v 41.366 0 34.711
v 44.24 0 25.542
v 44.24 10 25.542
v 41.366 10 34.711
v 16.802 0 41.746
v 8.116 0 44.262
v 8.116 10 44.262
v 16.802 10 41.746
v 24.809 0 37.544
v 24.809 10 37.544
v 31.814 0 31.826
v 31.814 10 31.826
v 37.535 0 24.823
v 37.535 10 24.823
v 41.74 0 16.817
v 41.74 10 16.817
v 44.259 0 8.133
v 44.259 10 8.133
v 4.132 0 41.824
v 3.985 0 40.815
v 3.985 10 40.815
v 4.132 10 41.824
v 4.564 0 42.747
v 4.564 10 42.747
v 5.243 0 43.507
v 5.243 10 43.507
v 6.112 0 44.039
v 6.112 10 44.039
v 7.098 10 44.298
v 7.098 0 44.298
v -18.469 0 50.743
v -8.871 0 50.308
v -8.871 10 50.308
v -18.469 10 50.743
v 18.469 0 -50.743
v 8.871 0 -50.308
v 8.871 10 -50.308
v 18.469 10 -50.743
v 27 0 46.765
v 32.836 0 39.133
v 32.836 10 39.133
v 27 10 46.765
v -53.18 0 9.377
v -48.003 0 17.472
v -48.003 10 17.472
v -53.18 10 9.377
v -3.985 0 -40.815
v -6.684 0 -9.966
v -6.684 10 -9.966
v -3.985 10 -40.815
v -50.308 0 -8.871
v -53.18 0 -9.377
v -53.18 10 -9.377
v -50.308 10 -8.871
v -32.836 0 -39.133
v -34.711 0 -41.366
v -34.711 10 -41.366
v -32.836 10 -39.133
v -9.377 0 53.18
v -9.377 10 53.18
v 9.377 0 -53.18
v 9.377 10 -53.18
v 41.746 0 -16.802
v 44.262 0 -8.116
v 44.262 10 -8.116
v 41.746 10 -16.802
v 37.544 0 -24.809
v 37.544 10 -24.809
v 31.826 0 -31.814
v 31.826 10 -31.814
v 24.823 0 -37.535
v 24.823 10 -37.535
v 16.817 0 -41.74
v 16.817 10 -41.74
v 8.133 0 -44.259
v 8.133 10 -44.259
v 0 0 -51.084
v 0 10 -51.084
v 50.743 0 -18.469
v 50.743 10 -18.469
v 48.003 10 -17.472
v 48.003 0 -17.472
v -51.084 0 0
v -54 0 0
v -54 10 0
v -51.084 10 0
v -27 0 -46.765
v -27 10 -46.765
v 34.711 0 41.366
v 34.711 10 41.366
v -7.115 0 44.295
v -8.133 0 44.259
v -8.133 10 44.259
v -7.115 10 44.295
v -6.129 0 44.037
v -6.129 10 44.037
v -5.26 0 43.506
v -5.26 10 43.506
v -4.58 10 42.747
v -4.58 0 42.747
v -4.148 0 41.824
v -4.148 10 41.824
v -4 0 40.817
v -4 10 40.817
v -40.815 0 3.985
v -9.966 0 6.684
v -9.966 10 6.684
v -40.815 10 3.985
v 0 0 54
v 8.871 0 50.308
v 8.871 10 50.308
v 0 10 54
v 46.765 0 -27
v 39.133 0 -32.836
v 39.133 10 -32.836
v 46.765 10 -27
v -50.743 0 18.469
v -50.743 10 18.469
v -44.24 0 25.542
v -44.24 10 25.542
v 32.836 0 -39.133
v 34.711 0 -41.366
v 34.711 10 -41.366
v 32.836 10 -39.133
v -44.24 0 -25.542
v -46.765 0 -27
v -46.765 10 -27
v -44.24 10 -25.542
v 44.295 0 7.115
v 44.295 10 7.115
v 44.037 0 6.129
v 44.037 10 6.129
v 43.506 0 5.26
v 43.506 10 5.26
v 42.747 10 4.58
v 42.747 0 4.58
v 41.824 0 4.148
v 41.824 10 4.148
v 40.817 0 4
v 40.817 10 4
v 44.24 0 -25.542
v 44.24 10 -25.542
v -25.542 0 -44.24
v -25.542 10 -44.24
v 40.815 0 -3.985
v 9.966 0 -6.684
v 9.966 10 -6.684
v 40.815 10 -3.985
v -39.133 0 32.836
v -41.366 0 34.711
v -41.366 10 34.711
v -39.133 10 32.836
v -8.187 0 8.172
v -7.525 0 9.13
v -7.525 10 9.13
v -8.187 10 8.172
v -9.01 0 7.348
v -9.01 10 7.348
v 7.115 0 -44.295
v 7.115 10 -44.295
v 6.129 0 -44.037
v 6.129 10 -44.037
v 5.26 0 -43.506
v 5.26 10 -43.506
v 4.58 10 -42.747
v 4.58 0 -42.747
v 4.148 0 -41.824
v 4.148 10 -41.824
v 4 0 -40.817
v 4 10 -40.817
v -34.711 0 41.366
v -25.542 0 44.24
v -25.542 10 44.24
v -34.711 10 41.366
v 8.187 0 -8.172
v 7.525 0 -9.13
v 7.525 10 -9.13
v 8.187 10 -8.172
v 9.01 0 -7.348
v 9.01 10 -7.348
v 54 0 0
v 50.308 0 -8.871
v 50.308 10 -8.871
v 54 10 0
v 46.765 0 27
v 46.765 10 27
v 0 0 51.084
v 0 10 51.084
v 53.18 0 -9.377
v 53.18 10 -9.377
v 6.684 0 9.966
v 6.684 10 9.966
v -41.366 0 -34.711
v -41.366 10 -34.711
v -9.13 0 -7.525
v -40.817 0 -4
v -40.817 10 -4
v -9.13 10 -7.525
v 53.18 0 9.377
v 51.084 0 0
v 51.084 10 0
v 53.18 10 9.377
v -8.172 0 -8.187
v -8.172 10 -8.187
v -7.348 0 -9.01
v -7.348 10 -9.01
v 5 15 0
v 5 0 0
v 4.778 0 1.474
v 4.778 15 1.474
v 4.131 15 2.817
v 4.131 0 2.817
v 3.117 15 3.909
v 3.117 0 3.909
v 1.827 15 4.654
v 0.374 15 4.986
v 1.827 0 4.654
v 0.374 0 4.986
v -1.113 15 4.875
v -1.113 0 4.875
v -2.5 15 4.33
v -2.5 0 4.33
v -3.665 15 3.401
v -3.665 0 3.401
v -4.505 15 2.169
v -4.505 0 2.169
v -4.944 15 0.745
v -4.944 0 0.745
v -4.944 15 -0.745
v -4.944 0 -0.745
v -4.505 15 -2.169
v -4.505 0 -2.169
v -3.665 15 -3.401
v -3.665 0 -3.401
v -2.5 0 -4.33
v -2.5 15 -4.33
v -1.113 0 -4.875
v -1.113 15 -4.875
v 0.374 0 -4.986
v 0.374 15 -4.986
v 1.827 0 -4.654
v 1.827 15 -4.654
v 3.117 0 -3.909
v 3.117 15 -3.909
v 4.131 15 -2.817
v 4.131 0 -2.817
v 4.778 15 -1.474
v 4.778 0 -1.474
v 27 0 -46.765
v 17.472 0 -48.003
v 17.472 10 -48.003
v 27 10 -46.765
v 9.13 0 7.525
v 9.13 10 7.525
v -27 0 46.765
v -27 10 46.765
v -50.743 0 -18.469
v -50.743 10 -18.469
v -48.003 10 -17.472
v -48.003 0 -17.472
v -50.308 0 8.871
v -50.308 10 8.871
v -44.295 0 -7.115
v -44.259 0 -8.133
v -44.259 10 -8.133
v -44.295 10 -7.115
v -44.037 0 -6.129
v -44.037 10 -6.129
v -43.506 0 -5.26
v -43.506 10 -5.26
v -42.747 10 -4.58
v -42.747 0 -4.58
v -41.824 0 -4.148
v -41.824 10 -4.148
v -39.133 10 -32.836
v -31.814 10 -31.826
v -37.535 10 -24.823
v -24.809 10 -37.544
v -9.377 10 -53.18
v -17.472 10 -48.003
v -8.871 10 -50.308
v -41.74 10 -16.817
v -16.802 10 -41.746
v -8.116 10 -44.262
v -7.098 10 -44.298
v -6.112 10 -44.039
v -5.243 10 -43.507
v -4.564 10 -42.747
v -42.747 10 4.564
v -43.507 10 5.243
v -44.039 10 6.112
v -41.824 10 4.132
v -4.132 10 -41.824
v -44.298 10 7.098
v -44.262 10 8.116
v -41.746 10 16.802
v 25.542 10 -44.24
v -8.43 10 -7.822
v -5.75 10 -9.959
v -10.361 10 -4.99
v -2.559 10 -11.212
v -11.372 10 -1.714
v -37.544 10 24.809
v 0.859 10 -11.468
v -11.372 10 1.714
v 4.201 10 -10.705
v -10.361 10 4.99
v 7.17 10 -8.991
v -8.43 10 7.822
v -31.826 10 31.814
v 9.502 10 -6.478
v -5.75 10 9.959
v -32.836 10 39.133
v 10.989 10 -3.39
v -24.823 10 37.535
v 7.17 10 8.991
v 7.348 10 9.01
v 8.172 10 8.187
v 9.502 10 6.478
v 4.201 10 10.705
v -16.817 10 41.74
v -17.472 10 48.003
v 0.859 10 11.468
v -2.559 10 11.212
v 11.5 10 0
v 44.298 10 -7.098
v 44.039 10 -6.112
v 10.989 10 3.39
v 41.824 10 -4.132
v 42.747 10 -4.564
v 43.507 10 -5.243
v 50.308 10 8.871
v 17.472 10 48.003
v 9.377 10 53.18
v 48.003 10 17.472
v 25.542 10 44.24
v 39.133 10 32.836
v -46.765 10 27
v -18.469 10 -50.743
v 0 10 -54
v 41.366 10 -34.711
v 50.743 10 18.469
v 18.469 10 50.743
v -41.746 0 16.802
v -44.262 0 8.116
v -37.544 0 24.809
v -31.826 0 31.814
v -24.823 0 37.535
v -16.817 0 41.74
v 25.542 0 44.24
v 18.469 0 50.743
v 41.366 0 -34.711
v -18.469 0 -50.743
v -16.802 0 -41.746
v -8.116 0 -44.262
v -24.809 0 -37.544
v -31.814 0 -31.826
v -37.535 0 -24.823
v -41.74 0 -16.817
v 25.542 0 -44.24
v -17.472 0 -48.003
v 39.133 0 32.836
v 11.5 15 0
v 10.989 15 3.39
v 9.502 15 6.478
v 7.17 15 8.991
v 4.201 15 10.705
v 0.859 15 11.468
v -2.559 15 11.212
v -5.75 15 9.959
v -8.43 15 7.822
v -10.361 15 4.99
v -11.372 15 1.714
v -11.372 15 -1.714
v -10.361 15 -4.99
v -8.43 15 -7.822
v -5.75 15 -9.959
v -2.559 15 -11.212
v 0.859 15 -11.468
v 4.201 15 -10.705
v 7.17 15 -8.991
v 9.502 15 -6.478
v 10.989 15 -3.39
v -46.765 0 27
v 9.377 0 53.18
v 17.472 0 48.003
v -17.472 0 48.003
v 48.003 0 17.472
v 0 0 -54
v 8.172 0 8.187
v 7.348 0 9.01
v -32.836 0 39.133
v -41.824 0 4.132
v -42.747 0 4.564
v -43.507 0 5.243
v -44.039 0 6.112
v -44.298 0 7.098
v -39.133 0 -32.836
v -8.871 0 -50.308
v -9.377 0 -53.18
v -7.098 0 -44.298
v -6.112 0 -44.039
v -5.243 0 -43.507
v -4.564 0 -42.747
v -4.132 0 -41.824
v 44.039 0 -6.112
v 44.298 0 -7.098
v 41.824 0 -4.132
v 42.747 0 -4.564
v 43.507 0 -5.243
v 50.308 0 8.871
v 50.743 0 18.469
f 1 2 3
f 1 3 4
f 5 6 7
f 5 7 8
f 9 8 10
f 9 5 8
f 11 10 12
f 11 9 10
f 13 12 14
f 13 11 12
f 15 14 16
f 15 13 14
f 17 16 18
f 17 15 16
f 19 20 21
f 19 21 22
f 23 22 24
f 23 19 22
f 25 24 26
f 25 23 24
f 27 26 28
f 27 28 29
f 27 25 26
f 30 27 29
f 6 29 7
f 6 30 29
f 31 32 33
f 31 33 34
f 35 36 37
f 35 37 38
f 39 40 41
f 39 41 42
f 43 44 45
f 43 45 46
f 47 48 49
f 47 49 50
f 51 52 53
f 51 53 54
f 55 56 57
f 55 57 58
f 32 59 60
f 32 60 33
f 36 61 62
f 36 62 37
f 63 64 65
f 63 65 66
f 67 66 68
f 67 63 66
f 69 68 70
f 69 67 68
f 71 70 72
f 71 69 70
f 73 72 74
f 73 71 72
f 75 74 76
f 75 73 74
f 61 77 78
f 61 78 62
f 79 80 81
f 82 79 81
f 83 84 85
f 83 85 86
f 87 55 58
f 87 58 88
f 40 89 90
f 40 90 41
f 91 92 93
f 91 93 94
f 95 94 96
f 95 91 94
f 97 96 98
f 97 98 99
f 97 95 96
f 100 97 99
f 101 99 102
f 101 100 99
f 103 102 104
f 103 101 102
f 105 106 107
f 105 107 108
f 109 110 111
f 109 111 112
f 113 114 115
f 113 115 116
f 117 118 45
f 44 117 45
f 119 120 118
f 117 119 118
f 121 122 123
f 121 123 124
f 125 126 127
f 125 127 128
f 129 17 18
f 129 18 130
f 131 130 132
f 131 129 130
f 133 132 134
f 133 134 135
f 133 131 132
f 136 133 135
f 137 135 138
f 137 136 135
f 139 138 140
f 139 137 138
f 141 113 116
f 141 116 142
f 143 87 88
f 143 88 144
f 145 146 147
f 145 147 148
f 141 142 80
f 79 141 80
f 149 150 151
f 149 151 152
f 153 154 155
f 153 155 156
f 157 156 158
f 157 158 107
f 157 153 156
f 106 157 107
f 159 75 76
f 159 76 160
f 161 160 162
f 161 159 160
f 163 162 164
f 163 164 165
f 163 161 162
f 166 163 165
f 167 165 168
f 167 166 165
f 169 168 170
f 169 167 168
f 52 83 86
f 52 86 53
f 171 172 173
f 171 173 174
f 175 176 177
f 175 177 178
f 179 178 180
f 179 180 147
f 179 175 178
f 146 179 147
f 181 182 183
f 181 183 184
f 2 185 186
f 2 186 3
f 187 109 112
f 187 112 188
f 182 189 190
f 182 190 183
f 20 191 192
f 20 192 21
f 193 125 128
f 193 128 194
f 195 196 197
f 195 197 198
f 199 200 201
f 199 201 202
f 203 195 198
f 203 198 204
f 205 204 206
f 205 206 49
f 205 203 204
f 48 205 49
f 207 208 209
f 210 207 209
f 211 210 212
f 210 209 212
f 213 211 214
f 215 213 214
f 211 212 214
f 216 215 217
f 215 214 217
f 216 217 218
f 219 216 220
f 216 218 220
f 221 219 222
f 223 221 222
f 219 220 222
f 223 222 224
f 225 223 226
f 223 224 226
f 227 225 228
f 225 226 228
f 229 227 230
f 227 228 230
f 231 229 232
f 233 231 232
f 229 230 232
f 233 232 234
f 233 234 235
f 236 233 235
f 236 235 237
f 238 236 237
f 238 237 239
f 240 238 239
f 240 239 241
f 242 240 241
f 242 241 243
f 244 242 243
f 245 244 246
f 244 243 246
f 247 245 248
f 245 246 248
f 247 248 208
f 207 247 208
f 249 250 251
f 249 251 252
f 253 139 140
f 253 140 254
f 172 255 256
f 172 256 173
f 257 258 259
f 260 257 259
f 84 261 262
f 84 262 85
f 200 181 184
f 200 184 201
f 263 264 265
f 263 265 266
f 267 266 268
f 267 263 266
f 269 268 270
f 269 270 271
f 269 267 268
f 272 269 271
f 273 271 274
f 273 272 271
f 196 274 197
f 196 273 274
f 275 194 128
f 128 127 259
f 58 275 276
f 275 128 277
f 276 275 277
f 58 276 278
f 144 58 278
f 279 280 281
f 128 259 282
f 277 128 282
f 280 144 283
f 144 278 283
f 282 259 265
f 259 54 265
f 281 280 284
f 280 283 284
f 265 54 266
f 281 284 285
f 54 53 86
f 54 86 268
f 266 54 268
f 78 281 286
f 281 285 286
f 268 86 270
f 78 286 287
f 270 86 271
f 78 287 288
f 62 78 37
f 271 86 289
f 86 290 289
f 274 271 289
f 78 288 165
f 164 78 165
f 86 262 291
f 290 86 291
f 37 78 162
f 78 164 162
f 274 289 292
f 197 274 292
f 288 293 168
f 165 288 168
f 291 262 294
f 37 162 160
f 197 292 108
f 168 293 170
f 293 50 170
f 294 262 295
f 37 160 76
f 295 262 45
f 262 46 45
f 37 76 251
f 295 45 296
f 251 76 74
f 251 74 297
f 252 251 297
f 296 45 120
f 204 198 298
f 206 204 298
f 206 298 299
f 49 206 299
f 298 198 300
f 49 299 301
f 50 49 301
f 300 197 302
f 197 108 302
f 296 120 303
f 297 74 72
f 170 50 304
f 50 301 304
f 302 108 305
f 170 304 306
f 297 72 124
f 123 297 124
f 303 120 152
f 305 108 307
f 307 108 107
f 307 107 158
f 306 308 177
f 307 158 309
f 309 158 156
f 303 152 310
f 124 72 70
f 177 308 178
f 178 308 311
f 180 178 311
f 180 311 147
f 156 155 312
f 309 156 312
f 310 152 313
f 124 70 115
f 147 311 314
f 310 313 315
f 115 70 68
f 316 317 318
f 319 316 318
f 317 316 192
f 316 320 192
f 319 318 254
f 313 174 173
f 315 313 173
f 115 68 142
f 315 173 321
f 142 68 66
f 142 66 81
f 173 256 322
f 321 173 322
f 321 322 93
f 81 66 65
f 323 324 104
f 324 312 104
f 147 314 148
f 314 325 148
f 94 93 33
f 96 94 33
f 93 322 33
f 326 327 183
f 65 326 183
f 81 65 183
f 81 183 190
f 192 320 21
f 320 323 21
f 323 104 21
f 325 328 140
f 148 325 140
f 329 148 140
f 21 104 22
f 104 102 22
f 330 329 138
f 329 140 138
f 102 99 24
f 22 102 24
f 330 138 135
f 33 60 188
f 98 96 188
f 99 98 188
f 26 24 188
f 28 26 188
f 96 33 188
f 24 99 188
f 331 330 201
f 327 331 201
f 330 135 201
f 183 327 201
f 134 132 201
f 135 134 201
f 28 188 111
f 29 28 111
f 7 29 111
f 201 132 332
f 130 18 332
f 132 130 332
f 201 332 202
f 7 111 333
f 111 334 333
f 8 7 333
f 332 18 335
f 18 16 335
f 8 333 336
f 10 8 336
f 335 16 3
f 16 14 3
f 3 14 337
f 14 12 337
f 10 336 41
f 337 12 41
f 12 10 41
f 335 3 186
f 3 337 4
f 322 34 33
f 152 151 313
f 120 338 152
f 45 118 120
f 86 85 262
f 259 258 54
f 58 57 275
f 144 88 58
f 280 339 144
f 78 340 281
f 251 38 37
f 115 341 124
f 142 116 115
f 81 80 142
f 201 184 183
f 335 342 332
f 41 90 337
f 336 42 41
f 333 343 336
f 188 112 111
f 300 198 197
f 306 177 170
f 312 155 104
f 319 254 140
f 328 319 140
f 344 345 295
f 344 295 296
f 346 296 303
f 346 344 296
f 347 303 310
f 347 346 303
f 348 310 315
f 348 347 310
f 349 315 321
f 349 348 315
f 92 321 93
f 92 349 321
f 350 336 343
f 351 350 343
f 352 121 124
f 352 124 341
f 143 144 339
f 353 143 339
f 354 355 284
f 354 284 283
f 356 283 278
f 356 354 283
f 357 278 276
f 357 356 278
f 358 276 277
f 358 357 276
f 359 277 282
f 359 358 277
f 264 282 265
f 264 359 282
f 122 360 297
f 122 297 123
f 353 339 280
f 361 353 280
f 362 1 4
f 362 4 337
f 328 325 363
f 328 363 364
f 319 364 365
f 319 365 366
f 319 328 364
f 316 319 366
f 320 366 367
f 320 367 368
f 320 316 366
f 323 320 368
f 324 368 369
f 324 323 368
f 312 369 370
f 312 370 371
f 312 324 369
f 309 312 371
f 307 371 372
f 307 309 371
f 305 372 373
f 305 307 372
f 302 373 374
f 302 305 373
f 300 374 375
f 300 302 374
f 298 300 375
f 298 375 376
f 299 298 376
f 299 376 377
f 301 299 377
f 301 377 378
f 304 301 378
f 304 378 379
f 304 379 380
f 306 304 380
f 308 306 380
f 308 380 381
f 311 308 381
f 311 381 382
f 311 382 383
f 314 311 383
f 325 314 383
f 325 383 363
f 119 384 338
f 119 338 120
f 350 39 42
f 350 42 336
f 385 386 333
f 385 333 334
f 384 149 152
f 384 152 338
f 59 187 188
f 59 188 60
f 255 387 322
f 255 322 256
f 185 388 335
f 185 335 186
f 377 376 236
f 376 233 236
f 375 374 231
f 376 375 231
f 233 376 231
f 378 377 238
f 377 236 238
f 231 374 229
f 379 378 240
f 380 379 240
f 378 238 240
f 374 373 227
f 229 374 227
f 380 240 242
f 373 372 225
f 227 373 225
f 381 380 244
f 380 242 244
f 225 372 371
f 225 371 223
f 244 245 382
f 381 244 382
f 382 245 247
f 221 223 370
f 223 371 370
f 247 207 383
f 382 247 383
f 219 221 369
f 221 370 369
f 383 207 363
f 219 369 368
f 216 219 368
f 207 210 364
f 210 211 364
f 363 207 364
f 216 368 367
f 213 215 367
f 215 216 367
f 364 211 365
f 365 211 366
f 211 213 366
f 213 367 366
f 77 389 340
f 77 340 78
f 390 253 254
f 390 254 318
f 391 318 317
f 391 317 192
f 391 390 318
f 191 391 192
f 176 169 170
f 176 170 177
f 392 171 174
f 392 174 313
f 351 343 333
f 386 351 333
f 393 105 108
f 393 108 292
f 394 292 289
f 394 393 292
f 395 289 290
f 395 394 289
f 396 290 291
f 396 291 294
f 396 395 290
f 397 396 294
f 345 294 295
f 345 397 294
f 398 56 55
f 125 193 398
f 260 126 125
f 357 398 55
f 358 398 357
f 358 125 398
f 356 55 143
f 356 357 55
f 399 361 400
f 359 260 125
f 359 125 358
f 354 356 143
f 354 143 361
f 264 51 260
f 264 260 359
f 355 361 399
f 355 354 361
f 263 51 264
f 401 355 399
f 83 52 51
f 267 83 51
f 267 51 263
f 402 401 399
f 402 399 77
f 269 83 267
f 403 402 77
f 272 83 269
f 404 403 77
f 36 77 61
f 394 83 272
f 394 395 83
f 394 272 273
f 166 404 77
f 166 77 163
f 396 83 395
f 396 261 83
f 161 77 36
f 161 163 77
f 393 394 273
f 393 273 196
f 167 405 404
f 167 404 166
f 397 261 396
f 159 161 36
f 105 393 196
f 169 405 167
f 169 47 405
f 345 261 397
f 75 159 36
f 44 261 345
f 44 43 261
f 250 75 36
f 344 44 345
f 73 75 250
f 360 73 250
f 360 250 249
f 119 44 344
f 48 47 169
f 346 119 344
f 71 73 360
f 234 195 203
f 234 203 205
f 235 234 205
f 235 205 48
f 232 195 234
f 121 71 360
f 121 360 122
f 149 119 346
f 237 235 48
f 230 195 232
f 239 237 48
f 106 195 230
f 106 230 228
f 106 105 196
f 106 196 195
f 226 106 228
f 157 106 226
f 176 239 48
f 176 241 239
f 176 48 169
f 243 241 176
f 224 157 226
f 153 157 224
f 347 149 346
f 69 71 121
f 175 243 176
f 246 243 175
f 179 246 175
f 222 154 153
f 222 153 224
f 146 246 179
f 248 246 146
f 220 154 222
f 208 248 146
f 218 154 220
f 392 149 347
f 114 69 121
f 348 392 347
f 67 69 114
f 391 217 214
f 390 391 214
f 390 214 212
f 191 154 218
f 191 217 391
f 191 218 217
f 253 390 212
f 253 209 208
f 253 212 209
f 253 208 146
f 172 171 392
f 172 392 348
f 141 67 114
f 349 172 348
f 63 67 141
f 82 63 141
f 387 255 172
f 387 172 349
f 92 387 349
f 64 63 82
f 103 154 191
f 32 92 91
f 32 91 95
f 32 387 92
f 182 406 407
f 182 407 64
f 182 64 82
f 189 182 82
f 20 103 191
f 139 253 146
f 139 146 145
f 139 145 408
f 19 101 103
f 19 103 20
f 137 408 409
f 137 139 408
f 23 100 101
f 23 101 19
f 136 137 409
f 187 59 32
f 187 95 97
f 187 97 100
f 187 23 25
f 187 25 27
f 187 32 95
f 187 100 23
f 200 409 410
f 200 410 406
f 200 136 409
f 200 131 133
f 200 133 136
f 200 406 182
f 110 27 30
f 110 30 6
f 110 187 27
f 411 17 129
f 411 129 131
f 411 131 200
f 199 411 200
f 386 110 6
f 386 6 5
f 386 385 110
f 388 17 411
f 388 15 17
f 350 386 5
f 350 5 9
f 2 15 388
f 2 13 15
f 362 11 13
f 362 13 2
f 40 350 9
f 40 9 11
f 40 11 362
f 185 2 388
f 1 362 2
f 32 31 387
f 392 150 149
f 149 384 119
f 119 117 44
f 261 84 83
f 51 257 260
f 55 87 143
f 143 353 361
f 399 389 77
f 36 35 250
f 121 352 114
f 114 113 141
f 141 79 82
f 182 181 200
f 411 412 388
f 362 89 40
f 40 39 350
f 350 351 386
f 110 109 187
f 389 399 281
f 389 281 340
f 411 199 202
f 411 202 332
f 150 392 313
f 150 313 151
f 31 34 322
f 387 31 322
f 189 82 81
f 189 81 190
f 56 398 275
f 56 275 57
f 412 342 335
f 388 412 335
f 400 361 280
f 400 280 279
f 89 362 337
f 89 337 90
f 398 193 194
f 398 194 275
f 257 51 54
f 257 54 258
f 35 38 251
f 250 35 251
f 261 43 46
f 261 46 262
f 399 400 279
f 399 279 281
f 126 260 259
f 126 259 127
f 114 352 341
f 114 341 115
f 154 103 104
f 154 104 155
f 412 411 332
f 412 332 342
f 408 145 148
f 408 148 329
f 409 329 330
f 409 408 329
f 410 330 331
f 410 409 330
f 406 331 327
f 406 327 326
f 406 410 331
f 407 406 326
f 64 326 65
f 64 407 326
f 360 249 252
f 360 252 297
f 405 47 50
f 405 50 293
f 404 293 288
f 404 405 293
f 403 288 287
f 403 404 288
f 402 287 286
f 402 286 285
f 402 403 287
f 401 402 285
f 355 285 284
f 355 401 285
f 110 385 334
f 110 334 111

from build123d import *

# Parameters (mm, degrees)
F0_R     = 11.5
F1_DEPTH = 10
F0_R_2   = 5
F2_DEPTH = 15


with BuildPart() as f1:
    # F0 (on Front) → F1 (new body)
    with BuildSketch(Plane.XZ):
        Polygon((0, 54), (0, 51.083995), (-9.377002, 53.179619), (-8.870643, 50.307914), (-18.469088, 50.743402), (-17.471755, 48.003253), (-27, 46.765372), (-25.541998, 44.240037), (-34.710531, 41.3664), (-32.836159, 39.132611), (-41.3664, 34.710531), (-39.132611, 32.836159), (-46.765372, 27), (-44.240037, 25.541998), (-50.743402, 18.469088), (-48.003253, 17.471755), (-53.179619, 9.377002), (-50.307914, 8.870643), (-54, 0), (-51.083995, 0), (-53.179619, -9.377002), (-50.307914, -8.870643), (-50.743402, -18.469088), (-48.003253, -17.471755), (-46.765372, -27), (-44.240037, -25.541998), (-41.3664, -34.710531), (-39.132611, -32.836159), (-34.710531, -41.3664), (-32.836159, -39.132611), (-27, -46.765372), (-25.541998, -44.240037), (-18.469088, -50.743402), (-17.471755, -48.003253), (-9.377002, -53.179619), (-8.870643, -50.307914), (0, -54), (0, -51.083995), (9.377002, -53.179619), (8.870643, -50.307914), (18.469088, -50.743402), (17.471755, -48.003253), (27, -46.765372), (25.541998, -44.240037), (34.710531, -41.3664), (32.836159, -39.132611), (41.3664, -34.710531), (39.132611, -32.836159), (46.765372, -27), (44.240037, -25.541998), (50.743402, -18.469088), (48.003253, -17.471755), (53.179619, -9.377002), (50.307914, -8.870643), (54, 0), (51.083995, 0), (53.179619, 9.377002), (50.307914, 8.870643), (50.743402, 18.469088), (48.003253, 17.471755), (46.765372, 27), (44.240037, 25.541998), (41.3664, 34.710531), (39.132611, 32.836159), (34.710531, 41.3664), (32.836159, 39.132611), (27, 46.765372), (25.541998, 44.240037), (18.469088, 50.743402), (17.471755, 48.003253), (9.377002, 53.179619), (8.870643, 50.307914), align=None)
        with BuildLine():
            Line((-6.683914, -9.966208), (-3.984963, -40.815351))
            ThreePointArc((-3.984963, -40.815351), (-5.242796, -43.506931), (-8.116223, -44.262026))
            ThreePointArc((-8.116223, -44.262026), (-31.813943, -31.825666), (-44.259032, -8.13253))
            ThreePointArc((-44.259032, -8.13253), (-43.505888, -5.259895), (-40.816663, -4))
            Line((-40.816663, -4), (-9.129554, -7.524517))
            ThreePointArc((-9.129554, -7.524517), (-7.741489, -8.57985), (-6.683914, -9.966208))
        make_face(mode=Mode.SUBTRACT)
        with BuildLine():
            Line((9.966208, -6.683914), (40.815351, -3.984963))
            ThreePointArc((40.815351, -3.984963), (43.506931, -5.242796), (44.262026, -8.116223))
            ThreePointArc((44.262026, -8.116223), (31.825666, -31.813943), (8.13253, -44.259032))
            ThreePointArc((8.13253, -44.259032), (5.259895, -43.505888), (4, -40.816663))
            Line((4, -40.816663), (7.524517, -9.129554))
            ThreePointArc((7.524517, -9.129554), (8.57985, -7.741489), (9.966208, -6.683914))
        make_face(mode=Mode.SUBTRACT)
        with BuildLine():
            ThreePointArc((-44.262026, 8.116223), (-31.825666, 31.813943), (-8.13253, 44.259032))
            ThreePointArc((-8.13253, 44.259032), (-5.259895, 43.505888), (-4, 40.816663))
            Line((-4, 40.816663), (-7.524517, 9.129554))
            ThreePointArc((-7.524517, 9.129554), (-8.57985, 7.741489), (-9.966208, 6.683914))
            Line((-9.966208, 6.683914), (-40.815351, 3.984963))
            ThreePointArc((-40.815351, 3.984963), (-43.506931, 5.242796), (-44.262026, 8.116223))
        make_face(mode=Mode.SUBTRACT)
        Circle(F0_R, mode=Mode.SUBTRACT)
        with BuildLine():
            Line((6.683914, 9.966208), (3.984963, 40.815351))
            ThreePointArc((3.984963, 40.815351), (5.242796, 43.506931), (8.116223, 44.262026))
            ThreePointArc((8.116223, 44.262026), (31.813943, 31.825666), (44.259032, 8.13253))
            ThreePointArc((44.259032, 8.13253), (43.505888, 5.259895), (40.816663, 4))
            Line((40.816663, 4), (9.129554, 7.524517))
            ThreePointArc((9.129554, 7.524517), (7.741489, 8.57985), (6.683914, 9.966208))
        make_face(mode=Mode.SUBTRACT)
    extrude(amount=-F1_DEPTH)

    # F0 (on Front) → F2 (join)
    with BuildSketch(Plane.XZ):
        Circle(F0_R)
        Circle(F0_R_2, mode=Mode.SUBTRACT)
    extrude(amount=-F2_DEPTH)


solid = f1.part
